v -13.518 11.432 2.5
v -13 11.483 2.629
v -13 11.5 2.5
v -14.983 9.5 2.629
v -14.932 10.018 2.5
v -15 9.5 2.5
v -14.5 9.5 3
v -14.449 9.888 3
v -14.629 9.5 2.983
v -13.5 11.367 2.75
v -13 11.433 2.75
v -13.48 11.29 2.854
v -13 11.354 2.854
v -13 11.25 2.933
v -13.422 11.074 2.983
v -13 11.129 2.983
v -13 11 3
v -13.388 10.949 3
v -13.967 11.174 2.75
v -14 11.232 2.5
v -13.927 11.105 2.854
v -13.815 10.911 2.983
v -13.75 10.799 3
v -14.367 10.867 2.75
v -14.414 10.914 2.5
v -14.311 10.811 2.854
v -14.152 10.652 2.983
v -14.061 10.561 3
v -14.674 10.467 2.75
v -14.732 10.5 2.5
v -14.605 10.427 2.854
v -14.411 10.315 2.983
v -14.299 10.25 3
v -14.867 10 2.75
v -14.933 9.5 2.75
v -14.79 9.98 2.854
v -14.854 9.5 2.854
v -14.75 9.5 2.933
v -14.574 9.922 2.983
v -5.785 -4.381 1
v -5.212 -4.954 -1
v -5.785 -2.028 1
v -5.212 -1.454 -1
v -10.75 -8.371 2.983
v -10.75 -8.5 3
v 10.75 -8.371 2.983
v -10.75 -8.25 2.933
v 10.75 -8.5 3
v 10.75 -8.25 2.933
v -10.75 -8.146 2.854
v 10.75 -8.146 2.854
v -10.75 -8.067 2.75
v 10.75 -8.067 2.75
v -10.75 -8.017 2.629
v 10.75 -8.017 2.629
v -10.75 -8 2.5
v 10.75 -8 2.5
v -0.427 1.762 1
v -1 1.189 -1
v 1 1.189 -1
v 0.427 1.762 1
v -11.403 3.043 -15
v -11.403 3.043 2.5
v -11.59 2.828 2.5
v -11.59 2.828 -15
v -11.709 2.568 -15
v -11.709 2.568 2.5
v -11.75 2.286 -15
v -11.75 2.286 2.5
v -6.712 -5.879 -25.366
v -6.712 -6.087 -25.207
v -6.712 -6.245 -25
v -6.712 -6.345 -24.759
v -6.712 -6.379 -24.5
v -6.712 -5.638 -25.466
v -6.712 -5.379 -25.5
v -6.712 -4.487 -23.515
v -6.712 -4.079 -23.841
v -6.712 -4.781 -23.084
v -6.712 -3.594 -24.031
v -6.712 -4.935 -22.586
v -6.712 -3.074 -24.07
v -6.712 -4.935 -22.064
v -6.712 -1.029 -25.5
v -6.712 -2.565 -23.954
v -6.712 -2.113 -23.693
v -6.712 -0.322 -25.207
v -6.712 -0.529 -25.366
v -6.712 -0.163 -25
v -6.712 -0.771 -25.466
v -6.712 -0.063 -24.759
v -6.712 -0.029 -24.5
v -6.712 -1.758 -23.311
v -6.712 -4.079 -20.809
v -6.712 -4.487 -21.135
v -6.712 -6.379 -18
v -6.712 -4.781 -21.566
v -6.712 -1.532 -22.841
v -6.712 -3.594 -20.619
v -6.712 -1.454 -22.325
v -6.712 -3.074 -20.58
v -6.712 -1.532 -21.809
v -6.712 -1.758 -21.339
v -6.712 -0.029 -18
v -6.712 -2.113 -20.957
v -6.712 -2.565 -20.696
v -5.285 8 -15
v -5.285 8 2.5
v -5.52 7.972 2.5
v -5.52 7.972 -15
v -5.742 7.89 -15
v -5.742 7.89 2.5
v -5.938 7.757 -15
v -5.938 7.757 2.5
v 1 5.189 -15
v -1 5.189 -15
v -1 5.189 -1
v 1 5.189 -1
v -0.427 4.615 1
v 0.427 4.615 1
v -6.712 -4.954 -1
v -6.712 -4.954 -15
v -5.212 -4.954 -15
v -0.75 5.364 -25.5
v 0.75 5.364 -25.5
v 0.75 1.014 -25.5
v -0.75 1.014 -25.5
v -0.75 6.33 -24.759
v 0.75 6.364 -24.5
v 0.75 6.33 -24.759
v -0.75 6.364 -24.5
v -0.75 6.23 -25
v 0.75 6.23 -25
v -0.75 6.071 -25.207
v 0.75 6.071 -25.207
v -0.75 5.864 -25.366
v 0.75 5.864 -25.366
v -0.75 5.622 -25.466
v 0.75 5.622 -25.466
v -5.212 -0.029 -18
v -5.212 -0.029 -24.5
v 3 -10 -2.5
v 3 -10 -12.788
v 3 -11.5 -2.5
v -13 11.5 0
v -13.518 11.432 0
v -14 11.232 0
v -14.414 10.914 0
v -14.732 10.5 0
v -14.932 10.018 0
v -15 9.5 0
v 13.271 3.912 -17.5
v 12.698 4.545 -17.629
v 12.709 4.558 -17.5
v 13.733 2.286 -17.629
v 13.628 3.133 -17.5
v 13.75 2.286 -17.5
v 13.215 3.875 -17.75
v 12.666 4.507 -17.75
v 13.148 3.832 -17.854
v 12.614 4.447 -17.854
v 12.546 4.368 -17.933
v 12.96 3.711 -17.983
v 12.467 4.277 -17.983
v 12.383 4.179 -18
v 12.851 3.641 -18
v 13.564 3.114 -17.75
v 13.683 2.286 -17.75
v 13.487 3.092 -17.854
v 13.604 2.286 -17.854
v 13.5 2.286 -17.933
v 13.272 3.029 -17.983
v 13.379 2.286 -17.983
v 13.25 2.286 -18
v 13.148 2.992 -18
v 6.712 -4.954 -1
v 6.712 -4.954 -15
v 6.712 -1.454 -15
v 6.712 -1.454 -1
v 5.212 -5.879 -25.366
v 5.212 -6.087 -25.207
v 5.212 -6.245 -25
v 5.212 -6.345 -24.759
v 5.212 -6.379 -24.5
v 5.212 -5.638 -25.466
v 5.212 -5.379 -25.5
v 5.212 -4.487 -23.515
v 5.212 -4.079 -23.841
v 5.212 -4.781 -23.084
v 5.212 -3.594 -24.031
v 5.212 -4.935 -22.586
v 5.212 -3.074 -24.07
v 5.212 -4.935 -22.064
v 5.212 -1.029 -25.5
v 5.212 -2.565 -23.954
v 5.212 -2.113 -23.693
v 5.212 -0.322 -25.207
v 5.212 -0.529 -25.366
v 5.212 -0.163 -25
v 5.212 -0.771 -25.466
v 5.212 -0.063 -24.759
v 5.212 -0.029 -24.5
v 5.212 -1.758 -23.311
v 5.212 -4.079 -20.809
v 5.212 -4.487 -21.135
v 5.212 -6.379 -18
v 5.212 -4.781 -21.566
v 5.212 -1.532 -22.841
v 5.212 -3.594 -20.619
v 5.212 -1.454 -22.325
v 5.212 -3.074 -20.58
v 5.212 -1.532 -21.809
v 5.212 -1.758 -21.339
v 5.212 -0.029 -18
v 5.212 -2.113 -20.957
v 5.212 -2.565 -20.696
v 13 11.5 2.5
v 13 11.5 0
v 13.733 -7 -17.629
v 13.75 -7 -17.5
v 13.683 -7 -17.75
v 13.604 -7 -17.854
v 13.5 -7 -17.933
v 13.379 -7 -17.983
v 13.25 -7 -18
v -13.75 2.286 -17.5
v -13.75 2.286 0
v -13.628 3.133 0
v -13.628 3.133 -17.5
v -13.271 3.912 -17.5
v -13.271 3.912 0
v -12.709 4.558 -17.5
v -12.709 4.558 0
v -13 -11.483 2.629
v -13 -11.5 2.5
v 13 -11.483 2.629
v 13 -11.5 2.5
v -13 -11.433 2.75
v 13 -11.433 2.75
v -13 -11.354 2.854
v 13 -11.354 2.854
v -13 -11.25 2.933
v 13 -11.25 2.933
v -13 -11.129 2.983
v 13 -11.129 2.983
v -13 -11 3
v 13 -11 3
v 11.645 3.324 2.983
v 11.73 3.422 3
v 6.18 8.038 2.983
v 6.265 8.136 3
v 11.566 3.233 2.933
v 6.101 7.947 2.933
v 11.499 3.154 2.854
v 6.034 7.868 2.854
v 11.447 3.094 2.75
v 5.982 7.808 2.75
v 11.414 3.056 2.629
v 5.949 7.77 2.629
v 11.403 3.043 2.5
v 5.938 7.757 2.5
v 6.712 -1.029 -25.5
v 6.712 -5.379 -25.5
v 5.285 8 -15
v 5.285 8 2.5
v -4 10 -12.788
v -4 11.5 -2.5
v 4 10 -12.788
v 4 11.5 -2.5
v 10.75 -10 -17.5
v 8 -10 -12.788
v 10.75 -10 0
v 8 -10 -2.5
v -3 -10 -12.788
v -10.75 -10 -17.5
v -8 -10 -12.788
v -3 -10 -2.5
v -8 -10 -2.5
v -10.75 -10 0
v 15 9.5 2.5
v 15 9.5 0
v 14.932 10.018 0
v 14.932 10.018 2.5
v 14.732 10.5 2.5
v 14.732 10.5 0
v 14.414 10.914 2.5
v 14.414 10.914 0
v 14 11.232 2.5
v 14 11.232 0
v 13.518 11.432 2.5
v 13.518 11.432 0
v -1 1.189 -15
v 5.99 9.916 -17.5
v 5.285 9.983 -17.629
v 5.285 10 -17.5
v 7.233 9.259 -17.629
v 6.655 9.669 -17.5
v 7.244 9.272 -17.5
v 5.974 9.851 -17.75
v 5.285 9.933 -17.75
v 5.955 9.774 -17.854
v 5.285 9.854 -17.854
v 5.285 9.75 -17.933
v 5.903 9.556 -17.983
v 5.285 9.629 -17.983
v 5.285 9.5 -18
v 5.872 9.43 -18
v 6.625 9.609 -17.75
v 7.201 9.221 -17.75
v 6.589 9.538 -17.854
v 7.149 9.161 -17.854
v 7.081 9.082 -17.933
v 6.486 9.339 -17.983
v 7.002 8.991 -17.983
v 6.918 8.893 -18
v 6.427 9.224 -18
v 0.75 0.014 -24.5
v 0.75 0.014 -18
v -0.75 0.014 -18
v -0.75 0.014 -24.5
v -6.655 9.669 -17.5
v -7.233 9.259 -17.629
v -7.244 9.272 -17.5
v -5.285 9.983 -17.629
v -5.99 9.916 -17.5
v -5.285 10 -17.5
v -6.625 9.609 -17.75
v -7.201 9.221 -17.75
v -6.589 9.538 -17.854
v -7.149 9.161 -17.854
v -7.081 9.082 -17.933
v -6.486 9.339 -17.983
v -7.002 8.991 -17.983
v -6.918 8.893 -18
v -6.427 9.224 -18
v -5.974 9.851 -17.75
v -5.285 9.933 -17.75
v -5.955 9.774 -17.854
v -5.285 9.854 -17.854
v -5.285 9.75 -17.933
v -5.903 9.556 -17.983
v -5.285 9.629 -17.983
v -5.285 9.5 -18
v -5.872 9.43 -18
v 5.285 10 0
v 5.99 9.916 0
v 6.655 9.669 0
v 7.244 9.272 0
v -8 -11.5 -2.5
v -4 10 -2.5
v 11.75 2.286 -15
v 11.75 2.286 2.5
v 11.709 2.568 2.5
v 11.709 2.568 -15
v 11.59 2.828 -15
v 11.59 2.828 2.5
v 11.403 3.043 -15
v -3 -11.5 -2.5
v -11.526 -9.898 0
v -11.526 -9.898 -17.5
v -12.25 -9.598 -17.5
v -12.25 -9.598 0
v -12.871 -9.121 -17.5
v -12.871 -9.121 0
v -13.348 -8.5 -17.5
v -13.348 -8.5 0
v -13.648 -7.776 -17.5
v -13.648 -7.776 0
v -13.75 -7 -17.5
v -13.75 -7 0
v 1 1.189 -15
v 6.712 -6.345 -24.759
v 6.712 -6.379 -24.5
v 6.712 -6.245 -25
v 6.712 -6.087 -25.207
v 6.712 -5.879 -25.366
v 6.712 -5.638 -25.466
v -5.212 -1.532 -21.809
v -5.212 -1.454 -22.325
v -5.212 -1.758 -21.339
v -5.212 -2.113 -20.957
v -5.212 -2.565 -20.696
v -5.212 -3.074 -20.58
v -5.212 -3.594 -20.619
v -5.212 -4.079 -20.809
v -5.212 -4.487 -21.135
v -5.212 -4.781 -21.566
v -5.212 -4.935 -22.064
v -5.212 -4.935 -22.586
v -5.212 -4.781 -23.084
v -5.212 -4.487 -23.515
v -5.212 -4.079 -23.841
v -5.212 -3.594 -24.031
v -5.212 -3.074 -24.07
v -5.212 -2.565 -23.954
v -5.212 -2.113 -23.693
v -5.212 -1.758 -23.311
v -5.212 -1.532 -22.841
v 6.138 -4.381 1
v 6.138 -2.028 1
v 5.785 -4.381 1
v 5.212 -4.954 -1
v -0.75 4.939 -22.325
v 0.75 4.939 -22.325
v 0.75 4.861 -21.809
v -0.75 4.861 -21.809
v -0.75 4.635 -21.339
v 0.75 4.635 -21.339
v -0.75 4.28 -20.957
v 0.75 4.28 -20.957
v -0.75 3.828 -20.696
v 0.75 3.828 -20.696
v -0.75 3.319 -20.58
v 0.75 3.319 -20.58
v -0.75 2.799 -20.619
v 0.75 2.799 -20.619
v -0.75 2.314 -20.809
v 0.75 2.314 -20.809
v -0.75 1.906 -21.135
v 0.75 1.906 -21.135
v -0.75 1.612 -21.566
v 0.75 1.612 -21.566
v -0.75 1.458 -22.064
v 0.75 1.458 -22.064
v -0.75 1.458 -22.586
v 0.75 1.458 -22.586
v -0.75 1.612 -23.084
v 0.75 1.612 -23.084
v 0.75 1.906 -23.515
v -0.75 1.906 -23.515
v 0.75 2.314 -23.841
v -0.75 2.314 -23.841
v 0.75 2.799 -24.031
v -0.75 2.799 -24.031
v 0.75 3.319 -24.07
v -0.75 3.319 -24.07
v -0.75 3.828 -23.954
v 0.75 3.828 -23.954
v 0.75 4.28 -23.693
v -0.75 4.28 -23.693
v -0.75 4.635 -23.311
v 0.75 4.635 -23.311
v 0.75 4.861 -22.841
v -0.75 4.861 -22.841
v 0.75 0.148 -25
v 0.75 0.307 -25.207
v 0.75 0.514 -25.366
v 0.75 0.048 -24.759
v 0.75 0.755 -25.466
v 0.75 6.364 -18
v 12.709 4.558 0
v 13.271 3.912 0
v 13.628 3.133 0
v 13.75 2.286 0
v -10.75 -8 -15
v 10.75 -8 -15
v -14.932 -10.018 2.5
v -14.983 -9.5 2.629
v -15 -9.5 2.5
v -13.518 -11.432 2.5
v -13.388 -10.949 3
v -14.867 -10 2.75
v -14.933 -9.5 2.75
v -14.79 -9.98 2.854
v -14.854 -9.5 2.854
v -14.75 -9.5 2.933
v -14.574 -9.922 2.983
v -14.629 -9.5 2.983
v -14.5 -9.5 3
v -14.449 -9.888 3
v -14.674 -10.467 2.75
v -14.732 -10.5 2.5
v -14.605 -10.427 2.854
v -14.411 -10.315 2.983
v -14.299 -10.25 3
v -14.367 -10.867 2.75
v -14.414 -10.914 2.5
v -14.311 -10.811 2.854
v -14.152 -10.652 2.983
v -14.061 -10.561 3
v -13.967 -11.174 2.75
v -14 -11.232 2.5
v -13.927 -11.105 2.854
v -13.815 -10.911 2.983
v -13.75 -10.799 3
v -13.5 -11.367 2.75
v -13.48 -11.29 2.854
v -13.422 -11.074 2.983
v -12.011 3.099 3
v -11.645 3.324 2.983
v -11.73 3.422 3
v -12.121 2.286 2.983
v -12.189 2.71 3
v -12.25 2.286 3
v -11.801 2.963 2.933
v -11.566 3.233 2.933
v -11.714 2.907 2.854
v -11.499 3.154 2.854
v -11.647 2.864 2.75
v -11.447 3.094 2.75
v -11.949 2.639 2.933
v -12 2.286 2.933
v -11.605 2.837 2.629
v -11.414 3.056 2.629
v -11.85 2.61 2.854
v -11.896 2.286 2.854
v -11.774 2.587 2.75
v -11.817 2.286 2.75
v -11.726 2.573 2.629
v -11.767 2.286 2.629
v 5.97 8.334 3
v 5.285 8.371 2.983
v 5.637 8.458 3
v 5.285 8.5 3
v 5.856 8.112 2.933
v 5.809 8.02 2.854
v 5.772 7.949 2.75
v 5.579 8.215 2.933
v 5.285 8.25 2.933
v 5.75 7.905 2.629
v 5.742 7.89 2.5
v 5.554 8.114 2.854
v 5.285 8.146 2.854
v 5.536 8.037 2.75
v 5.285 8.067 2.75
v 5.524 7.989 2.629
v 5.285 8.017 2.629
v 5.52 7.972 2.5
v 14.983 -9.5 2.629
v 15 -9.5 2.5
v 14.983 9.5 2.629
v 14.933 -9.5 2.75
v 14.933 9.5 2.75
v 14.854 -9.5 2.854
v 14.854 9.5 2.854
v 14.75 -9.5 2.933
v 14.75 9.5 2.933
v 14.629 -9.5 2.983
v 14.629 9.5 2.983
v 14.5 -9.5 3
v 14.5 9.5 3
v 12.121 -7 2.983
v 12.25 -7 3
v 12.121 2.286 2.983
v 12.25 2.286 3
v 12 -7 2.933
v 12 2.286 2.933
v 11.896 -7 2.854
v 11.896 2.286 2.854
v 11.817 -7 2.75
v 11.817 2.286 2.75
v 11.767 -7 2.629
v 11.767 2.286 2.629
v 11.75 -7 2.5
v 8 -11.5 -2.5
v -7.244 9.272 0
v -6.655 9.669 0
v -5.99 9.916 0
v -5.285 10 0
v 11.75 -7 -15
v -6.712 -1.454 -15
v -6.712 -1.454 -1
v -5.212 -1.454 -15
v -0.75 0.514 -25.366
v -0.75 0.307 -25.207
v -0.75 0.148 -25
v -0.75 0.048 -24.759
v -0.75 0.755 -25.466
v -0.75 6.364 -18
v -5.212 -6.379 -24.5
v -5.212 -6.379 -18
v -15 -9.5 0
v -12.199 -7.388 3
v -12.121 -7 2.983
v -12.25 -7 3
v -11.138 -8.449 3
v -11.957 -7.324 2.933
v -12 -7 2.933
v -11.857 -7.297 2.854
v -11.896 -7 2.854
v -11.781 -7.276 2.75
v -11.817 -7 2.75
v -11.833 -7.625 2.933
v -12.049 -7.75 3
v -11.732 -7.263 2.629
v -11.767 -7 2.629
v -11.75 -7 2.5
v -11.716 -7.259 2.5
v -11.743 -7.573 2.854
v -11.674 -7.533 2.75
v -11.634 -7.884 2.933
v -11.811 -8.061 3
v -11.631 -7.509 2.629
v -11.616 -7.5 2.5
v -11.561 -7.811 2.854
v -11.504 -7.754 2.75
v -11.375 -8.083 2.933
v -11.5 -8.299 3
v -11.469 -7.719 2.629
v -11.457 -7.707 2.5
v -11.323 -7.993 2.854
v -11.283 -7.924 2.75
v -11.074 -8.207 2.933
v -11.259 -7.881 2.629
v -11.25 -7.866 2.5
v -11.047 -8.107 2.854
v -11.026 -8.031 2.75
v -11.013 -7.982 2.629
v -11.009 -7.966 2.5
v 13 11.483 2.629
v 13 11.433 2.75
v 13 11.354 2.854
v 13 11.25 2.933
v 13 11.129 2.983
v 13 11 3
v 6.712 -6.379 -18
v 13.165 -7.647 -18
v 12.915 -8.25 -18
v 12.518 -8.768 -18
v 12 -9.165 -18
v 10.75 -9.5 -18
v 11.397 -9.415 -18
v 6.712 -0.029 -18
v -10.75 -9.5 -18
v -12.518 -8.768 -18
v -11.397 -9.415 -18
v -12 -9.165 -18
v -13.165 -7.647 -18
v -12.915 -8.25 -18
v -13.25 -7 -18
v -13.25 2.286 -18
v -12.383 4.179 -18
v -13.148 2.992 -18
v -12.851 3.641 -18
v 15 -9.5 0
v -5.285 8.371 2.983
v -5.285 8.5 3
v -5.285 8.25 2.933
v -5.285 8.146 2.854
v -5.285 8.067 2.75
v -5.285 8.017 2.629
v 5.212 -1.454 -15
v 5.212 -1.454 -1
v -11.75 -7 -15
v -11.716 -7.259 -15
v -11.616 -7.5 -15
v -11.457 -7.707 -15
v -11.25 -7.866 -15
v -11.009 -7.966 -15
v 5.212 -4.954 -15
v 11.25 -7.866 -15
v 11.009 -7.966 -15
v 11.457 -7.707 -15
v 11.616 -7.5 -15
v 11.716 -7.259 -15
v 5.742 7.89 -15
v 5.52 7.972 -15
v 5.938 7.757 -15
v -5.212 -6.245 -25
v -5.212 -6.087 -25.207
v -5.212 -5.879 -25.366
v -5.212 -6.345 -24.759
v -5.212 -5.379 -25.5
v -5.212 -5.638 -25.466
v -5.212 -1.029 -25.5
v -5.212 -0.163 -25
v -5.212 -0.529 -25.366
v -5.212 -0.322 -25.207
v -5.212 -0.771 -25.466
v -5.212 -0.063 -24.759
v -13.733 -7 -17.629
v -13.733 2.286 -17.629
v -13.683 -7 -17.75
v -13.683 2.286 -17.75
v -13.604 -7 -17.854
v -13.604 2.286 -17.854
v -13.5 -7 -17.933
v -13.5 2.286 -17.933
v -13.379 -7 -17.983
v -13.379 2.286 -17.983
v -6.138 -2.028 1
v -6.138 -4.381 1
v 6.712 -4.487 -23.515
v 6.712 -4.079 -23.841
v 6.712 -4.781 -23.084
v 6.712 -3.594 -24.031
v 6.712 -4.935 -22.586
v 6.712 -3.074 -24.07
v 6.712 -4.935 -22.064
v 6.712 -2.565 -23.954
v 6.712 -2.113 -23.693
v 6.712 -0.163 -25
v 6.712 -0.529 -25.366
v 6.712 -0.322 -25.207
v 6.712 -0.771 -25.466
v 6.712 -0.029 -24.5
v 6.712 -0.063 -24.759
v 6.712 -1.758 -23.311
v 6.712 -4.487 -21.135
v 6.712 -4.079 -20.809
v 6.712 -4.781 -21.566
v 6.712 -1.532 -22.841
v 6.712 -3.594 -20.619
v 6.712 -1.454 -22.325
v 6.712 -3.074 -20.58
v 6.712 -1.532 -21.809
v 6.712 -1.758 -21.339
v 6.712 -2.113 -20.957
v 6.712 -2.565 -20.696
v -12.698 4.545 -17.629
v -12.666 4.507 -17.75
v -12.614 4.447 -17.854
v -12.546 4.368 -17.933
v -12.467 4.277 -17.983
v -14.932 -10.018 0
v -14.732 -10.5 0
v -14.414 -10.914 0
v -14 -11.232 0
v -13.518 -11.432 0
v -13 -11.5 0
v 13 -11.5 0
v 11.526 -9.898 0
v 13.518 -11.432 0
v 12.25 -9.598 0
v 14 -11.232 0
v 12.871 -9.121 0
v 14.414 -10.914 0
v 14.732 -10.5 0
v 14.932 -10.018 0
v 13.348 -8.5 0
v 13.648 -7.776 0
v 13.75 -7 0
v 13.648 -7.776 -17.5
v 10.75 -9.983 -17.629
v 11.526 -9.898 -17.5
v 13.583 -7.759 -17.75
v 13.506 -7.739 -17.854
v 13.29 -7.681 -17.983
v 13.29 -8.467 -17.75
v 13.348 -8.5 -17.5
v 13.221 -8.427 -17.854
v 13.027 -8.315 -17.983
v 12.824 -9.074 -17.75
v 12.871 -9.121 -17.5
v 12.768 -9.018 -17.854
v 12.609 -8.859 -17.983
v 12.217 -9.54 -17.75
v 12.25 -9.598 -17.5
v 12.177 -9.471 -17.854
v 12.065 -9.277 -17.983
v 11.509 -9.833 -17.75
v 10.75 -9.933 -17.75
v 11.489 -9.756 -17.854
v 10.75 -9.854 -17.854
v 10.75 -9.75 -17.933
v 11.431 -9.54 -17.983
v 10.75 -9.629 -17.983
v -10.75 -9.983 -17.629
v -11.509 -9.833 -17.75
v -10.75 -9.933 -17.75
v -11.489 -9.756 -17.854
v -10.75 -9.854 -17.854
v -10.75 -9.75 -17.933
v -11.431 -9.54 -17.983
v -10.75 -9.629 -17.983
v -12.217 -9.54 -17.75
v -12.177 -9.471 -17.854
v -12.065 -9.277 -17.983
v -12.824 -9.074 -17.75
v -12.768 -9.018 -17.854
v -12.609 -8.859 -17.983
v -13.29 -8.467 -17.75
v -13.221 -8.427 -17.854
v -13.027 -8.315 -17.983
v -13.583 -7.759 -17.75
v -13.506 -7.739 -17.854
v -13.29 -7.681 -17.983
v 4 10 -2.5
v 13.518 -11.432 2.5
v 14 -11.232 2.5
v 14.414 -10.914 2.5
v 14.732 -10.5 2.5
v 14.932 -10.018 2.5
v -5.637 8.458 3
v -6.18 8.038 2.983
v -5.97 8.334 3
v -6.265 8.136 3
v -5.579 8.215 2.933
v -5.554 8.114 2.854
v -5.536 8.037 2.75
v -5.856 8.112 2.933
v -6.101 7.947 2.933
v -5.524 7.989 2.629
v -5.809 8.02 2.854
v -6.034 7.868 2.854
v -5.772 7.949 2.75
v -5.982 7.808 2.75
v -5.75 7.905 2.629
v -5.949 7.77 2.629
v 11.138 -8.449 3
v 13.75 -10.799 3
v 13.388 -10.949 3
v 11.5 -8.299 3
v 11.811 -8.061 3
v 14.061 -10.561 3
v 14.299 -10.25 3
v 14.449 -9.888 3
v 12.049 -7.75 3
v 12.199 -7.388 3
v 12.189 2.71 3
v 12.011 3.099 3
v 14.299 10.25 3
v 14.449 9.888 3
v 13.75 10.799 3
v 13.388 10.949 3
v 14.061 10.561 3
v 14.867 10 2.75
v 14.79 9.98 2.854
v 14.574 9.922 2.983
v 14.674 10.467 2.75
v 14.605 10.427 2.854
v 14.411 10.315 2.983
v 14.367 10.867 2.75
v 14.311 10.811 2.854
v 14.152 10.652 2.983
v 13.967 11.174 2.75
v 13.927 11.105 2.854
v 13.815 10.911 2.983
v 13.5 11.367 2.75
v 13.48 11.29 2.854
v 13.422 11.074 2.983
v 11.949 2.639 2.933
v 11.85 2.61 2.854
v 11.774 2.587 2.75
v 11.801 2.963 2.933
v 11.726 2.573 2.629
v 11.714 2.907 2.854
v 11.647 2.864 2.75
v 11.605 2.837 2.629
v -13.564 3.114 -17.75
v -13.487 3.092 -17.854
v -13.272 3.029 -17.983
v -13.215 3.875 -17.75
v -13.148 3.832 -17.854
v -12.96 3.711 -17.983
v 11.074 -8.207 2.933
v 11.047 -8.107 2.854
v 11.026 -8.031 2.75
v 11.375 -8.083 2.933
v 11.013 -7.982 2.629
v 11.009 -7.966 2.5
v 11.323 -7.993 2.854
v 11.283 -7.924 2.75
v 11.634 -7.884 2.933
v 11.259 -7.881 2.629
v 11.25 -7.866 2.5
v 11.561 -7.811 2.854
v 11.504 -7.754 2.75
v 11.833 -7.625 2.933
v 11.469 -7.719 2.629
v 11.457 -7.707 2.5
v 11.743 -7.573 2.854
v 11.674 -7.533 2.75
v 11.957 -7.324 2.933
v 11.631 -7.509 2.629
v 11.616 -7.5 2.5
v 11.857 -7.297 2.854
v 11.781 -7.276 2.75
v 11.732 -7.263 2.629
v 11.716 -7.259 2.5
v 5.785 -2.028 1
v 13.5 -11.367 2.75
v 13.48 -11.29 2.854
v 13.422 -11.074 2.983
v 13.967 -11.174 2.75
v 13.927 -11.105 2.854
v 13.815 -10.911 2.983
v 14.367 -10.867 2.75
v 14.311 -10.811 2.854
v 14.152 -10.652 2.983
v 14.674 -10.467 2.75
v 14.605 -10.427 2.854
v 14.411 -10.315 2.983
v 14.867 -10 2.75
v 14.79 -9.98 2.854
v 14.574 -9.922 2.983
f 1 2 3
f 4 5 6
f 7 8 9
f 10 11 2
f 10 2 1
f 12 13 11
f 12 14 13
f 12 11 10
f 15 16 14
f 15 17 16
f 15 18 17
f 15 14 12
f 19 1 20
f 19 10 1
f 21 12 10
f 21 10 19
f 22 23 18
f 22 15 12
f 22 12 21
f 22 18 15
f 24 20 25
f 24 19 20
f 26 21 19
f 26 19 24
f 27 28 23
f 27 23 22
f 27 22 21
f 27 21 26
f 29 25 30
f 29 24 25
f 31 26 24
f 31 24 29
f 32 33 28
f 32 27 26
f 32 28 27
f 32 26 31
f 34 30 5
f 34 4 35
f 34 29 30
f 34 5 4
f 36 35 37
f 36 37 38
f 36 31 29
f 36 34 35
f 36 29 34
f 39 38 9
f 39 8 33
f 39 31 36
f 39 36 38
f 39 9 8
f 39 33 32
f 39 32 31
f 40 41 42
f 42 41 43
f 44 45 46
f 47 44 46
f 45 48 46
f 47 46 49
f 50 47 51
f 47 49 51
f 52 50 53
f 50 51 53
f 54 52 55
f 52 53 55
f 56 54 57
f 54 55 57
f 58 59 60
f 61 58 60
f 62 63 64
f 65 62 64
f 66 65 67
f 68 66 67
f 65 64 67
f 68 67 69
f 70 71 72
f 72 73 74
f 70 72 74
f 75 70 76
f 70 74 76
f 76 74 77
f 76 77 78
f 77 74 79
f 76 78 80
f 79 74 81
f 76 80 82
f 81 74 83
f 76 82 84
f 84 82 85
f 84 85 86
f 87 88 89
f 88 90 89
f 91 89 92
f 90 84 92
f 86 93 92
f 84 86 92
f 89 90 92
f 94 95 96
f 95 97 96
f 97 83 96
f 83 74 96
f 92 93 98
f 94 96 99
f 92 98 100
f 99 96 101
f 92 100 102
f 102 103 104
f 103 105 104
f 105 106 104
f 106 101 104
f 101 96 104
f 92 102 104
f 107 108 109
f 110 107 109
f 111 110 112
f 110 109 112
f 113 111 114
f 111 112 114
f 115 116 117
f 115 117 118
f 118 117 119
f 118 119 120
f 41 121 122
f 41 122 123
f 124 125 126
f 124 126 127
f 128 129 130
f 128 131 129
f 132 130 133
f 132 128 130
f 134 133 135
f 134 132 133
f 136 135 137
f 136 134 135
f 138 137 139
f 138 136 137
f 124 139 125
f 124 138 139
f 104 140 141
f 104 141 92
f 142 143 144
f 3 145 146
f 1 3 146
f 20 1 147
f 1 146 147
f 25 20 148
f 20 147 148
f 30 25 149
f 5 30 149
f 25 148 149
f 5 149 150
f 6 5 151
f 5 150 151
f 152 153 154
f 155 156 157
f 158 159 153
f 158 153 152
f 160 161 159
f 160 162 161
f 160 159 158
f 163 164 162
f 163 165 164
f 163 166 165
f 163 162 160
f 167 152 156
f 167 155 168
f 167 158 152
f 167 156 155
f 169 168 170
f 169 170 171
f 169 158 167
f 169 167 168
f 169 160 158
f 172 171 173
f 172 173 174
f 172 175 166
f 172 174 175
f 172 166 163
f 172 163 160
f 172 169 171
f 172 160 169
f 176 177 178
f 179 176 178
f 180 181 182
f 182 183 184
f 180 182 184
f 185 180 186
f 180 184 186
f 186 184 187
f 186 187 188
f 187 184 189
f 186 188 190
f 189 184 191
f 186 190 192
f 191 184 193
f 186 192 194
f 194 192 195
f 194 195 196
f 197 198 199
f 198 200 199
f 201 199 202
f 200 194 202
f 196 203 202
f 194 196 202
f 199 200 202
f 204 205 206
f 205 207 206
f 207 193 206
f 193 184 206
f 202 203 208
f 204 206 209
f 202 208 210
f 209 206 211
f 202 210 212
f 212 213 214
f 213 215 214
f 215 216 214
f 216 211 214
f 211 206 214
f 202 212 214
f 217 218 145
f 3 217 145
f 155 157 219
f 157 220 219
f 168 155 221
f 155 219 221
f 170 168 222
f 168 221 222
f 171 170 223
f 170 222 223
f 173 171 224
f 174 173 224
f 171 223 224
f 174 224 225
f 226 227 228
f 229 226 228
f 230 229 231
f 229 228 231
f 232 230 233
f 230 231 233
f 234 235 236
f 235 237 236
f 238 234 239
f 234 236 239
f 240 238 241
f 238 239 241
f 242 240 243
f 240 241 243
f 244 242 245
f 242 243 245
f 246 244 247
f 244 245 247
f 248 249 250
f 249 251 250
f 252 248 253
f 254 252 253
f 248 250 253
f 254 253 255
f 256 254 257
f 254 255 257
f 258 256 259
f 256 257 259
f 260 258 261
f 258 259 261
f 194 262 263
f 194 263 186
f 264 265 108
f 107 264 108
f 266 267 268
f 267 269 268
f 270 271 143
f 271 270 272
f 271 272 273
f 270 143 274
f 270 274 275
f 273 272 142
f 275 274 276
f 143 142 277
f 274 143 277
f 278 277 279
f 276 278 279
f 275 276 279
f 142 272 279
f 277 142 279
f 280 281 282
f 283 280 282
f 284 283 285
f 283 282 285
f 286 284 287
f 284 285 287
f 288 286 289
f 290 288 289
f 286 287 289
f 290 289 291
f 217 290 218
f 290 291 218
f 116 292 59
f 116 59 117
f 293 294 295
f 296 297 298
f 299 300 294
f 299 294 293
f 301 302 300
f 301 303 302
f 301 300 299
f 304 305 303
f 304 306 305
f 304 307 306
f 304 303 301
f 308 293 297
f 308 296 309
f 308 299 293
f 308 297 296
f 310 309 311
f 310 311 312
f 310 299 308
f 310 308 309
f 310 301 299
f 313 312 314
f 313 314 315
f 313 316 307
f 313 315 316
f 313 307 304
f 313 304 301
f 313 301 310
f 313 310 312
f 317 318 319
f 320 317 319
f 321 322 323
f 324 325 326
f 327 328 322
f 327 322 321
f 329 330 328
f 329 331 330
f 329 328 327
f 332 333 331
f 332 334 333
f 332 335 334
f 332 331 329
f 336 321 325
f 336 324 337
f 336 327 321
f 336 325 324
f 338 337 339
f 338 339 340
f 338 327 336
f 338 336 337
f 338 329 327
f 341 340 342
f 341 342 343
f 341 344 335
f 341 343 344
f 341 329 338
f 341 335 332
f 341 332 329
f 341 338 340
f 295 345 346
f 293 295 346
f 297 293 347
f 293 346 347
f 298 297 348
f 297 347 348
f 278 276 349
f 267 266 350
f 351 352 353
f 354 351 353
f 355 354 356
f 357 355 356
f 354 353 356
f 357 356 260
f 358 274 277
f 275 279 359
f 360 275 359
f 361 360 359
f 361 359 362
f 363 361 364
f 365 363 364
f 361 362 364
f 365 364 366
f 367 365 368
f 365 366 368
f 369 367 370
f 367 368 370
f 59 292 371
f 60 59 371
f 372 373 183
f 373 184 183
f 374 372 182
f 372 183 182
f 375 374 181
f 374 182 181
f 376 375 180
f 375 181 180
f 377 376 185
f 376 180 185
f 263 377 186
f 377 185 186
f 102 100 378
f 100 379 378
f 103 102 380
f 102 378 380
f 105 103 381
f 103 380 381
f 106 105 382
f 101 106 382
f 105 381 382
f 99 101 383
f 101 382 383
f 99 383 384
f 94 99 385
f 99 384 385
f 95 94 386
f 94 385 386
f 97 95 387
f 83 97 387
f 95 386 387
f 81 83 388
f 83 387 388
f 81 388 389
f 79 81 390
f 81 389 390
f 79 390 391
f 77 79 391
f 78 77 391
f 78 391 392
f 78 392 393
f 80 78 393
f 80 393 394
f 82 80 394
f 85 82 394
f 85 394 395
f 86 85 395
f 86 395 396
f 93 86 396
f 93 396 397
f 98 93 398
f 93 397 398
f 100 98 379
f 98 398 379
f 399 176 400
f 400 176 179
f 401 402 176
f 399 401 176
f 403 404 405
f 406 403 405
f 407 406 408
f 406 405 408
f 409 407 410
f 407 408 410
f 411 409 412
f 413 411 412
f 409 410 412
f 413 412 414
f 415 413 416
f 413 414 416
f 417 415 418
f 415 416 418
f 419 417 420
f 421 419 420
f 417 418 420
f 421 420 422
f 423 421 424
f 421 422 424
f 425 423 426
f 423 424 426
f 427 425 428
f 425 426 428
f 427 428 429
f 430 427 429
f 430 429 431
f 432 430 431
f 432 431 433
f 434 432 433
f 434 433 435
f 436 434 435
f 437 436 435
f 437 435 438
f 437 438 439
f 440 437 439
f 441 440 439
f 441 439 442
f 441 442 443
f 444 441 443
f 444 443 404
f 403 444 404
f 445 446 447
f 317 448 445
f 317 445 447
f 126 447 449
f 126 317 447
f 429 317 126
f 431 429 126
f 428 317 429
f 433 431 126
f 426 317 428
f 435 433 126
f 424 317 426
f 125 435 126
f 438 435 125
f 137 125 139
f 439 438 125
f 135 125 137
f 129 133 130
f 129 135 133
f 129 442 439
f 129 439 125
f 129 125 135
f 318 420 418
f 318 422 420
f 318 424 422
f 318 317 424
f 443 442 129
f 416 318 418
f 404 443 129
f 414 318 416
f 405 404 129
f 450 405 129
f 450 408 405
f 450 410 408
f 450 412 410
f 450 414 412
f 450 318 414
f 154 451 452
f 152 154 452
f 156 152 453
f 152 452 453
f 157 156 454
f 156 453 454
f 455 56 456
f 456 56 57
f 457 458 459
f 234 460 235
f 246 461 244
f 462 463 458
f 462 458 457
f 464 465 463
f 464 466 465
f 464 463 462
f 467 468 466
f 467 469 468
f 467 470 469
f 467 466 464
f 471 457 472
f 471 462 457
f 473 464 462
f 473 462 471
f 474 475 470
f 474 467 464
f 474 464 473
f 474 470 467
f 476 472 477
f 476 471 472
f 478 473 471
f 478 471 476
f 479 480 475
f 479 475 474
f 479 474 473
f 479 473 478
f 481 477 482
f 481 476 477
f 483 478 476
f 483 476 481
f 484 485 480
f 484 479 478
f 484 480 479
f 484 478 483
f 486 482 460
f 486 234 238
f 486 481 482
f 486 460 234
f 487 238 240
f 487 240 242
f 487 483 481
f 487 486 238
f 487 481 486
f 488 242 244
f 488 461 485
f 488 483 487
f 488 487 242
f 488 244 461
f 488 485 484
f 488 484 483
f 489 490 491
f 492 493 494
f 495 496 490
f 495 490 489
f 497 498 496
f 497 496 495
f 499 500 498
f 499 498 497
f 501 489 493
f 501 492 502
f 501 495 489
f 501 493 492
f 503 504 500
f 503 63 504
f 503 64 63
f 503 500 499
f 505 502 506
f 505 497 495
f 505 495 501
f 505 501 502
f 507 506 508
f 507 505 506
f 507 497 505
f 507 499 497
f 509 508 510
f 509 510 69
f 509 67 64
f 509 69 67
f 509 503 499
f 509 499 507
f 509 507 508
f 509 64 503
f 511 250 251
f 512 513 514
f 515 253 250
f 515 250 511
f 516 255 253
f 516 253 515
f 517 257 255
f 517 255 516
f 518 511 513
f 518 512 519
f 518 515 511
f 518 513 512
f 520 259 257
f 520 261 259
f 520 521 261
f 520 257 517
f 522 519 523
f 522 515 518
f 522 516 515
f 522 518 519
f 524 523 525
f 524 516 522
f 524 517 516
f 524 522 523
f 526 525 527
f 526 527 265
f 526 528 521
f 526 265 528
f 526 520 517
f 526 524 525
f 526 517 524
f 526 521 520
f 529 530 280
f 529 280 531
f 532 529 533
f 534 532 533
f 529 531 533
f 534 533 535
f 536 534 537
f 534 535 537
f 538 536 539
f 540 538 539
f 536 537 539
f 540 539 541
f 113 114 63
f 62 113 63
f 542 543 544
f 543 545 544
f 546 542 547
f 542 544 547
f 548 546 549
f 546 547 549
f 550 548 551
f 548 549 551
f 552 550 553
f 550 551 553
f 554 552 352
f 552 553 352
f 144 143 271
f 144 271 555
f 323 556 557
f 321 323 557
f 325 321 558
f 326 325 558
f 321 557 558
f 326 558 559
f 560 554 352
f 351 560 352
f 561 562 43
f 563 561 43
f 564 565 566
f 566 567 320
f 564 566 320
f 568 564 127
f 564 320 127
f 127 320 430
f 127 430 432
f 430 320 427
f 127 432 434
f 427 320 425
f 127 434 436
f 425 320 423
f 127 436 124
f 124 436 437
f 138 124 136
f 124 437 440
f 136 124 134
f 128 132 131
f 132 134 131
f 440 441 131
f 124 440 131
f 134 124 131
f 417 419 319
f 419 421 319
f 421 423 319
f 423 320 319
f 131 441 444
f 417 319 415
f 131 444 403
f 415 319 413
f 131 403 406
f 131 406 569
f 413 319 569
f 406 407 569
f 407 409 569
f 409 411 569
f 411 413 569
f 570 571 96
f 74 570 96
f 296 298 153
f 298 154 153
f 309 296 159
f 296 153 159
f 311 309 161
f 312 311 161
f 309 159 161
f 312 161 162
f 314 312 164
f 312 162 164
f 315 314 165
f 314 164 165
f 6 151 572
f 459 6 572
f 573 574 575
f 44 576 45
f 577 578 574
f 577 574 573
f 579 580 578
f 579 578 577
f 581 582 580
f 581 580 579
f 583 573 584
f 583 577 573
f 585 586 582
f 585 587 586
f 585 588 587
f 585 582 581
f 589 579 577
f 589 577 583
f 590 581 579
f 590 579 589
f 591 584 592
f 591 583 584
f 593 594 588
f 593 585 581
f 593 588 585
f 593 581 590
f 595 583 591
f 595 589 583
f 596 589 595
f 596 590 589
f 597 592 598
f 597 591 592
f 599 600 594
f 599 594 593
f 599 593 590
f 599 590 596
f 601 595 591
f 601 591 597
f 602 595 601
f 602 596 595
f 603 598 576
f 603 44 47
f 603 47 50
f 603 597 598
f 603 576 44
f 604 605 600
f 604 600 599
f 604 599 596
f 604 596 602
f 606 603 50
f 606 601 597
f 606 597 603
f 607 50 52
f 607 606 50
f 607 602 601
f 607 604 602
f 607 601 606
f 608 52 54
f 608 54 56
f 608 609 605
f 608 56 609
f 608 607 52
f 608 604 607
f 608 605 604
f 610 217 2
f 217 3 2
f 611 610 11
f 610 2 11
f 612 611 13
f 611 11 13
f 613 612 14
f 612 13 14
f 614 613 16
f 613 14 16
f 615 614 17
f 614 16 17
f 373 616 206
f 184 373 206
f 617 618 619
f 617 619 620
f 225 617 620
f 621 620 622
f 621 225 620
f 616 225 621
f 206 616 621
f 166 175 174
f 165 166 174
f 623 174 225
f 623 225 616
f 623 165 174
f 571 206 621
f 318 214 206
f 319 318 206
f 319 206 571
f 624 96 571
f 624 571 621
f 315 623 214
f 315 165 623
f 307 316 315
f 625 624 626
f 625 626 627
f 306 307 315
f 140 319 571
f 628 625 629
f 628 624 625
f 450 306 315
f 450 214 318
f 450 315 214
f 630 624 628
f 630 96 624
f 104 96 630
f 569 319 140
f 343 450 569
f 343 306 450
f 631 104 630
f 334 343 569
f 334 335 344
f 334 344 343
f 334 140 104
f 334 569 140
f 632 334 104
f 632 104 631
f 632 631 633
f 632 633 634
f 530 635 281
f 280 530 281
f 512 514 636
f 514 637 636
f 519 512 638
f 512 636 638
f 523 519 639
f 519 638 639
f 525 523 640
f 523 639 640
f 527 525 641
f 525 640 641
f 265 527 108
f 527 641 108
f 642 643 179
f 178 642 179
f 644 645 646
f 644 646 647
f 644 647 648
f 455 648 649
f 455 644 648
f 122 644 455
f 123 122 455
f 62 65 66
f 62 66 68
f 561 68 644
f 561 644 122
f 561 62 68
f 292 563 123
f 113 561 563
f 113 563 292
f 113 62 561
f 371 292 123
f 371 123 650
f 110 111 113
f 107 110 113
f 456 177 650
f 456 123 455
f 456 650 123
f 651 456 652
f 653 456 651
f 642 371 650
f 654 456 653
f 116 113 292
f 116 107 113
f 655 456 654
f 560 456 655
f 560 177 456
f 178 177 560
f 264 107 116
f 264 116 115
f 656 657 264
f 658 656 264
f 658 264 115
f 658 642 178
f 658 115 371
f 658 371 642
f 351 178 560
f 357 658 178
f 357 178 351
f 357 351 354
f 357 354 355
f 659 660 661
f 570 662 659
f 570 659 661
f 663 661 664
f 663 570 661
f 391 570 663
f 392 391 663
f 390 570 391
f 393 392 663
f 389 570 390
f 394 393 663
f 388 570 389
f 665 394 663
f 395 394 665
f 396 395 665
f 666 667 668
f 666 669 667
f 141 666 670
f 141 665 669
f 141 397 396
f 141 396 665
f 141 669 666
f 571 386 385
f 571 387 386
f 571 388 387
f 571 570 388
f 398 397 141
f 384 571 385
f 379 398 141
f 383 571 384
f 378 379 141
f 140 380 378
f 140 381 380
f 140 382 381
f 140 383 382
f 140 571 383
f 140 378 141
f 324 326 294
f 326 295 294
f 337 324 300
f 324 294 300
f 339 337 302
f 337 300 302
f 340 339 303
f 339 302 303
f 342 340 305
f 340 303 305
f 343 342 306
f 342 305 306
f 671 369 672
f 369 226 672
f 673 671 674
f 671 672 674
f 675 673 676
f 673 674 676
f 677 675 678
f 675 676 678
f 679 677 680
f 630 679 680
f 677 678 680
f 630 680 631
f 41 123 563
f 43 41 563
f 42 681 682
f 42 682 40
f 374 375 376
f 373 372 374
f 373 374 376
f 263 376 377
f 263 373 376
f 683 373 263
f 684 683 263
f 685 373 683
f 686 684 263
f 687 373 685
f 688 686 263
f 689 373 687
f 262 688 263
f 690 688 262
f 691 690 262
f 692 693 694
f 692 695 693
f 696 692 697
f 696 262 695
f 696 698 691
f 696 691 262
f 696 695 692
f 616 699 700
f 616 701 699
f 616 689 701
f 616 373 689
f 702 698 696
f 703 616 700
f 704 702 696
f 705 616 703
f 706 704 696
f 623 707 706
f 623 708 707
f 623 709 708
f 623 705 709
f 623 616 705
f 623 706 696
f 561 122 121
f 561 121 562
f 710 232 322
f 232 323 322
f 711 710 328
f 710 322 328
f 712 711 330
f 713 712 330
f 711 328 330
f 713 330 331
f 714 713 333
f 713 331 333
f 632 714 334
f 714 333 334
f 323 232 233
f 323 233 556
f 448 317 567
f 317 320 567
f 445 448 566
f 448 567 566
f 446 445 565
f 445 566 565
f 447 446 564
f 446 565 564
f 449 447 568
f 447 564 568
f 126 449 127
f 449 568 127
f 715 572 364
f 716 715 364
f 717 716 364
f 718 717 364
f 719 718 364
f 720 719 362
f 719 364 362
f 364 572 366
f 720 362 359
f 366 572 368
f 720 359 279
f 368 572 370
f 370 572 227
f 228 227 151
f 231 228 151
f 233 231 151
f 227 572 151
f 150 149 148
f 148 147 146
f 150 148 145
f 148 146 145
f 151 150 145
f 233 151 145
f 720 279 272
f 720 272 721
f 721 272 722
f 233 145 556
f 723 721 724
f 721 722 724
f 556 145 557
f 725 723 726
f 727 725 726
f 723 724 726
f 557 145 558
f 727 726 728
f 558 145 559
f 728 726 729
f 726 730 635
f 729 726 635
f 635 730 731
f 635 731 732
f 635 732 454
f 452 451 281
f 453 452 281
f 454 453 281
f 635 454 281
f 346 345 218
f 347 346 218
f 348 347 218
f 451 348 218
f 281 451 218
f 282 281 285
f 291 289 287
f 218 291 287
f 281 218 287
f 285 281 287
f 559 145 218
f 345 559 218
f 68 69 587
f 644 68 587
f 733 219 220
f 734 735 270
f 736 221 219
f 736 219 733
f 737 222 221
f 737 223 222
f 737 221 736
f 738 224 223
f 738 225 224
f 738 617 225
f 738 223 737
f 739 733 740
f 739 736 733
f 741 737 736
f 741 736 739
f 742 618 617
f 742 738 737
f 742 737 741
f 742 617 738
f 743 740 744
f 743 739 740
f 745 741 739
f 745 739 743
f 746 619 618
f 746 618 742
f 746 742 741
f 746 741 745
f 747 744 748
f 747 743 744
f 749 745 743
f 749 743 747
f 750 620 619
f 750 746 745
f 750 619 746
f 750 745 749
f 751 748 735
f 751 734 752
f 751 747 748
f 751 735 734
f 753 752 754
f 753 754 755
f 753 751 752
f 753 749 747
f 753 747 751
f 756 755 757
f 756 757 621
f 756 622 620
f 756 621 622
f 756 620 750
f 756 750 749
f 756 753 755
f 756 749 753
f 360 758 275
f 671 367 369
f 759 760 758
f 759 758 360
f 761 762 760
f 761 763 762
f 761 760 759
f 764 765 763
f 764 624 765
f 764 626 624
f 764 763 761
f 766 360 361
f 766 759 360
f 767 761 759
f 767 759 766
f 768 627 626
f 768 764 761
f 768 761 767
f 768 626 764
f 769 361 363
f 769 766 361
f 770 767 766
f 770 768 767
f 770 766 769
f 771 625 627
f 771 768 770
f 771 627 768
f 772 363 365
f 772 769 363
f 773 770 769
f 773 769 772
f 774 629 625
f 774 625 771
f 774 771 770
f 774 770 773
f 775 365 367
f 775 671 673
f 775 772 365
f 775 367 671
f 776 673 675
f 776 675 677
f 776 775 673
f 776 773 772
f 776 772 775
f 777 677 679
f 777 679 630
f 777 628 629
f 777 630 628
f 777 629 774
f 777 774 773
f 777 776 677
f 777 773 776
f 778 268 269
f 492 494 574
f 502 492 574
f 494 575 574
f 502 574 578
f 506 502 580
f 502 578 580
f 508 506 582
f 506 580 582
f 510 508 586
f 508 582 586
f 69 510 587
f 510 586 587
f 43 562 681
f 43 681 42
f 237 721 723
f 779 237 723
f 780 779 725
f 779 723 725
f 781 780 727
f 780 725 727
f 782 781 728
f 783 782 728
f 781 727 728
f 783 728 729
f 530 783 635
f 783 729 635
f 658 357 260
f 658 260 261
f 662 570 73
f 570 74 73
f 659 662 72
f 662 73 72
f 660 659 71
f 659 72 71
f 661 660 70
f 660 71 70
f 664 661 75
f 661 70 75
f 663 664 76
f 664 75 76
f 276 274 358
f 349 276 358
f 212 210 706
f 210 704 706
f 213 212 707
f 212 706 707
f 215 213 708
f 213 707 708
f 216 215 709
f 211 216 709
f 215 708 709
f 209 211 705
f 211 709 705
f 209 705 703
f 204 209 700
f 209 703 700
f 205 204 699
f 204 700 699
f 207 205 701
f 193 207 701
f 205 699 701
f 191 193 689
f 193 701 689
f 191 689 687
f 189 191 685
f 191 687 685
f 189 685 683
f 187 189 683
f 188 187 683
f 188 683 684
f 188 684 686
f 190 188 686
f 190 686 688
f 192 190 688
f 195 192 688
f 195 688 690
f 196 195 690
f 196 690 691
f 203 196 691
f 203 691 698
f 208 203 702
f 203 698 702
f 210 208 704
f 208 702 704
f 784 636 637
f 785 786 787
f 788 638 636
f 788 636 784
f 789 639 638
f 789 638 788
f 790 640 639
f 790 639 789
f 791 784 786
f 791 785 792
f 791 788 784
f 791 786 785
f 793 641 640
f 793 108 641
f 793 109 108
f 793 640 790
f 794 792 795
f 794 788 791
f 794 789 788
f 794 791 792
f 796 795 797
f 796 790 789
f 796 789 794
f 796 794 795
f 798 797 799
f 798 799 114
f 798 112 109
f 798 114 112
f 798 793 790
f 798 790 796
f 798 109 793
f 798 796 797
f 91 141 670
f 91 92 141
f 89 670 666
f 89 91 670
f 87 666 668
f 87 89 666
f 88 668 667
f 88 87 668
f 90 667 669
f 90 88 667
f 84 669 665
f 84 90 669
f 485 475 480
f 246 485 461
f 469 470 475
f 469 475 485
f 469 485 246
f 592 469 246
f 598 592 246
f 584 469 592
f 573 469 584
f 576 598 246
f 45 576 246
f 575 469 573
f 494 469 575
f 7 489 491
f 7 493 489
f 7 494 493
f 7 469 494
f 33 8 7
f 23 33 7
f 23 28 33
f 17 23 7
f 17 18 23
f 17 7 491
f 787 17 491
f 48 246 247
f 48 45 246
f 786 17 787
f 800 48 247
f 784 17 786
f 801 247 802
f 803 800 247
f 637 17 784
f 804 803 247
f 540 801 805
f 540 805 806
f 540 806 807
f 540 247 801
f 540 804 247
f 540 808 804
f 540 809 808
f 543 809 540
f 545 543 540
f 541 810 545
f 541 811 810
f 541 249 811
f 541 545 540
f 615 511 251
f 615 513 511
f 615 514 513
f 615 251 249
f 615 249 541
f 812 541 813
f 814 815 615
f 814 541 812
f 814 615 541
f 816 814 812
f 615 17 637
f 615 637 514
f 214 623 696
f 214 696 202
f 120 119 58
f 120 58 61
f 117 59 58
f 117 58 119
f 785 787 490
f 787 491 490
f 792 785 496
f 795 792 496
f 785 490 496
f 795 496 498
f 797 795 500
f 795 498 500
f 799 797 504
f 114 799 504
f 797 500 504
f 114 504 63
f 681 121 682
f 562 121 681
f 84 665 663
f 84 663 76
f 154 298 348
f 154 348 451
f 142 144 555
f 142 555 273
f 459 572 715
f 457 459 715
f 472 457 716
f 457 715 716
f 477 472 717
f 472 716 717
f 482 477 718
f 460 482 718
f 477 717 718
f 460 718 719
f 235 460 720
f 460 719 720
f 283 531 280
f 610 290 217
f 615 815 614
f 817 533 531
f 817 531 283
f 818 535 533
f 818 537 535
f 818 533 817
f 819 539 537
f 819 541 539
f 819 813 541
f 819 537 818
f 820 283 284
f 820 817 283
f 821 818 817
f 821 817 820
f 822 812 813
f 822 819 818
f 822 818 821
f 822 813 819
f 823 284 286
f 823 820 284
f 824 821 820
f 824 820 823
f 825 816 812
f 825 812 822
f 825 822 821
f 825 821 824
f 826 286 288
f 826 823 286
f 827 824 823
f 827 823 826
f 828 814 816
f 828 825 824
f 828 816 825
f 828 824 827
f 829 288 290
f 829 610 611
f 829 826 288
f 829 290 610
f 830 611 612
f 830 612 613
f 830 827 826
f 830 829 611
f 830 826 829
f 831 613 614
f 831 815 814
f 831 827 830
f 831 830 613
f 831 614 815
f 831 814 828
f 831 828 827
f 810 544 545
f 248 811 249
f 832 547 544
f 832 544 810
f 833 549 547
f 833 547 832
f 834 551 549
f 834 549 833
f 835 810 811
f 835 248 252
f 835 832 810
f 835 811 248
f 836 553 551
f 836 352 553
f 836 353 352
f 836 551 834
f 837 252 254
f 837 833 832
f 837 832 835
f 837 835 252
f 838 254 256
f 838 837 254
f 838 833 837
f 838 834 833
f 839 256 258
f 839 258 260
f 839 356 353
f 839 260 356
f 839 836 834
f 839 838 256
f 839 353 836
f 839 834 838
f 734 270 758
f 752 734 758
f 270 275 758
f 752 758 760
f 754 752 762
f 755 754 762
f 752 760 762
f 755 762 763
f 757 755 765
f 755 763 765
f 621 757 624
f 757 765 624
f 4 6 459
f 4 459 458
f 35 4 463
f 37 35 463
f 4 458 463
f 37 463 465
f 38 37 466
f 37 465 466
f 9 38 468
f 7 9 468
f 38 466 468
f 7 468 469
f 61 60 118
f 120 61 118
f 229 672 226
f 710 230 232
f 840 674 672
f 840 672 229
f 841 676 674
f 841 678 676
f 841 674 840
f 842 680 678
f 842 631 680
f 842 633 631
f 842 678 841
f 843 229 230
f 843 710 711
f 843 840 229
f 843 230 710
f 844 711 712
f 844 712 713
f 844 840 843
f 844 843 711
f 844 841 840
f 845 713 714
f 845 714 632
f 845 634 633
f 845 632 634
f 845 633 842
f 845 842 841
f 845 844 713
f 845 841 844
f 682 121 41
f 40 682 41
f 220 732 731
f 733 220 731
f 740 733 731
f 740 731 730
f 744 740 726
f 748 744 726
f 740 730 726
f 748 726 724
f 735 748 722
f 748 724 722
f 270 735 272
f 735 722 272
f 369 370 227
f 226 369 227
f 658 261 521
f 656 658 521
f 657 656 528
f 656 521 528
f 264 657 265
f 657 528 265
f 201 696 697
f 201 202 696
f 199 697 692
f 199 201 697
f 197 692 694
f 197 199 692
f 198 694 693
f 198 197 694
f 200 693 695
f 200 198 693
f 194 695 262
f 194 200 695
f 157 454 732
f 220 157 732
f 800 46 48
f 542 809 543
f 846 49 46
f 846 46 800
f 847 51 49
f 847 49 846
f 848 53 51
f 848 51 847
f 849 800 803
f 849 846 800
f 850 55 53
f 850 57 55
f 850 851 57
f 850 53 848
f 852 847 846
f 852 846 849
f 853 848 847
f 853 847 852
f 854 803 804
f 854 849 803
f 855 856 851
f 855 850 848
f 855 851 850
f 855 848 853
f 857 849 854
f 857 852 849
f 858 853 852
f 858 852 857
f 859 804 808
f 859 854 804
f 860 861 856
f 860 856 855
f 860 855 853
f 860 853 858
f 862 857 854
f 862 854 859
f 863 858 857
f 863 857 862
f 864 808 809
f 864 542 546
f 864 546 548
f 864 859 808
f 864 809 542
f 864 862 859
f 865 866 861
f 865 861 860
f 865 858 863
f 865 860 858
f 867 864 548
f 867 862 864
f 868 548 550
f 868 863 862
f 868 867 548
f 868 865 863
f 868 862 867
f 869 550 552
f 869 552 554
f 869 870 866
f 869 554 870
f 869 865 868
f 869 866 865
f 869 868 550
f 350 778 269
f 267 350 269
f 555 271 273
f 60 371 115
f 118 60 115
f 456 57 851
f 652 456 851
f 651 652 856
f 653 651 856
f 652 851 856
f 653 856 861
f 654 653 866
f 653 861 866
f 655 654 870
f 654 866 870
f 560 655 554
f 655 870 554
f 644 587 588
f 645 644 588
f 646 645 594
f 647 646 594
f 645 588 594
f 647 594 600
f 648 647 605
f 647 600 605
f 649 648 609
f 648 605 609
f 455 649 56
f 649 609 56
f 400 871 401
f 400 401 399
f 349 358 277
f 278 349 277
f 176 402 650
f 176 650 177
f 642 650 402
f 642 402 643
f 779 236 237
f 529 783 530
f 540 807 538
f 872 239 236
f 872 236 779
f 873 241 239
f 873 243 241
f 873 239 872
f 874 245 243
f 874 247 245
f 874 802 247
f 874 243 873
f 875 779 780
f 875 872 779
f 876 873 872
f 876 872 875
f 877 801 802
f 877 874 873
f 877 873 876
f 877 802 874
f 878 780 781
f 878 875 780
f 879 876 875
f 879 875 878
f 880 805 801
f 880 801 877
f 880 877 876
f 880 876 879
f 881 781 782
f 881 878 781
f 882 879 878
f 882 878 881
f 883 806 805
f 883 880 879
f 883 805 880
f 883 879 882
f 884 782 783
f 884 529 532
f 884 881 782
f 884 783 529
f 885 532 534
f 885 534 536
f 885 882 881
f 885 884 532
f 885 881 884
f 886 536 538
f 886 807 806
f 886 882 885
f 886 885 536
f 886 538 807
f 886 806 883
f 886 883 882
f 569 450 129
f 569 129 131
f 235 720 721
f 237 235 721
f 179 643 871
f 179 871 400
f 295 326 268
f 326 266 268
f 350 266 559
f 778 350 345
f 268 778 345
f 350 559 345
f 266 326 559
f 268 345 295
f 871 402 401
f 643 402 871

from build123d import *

# Parameters (mm, degrees)
BOSS_EXTRUDE1_DEPTH           = 3
BOSS_EXTRUDE2_DEPTH           = 18
CUT_EXTRUDE1_DEPTH            = 18
FILLET2_R                     = 0.5
BOSS_EXTRUDE3_DEPTH           = 4
BOSS_EXTRUDE4_START           = 3
BOSS_EXTRUDE4_DEPTH           = 5
SKETCH6_W                     = 2
SKETCH6_H                     = 4
SKETCH6_W_2                   = 1.5
SKETCH6_H_2                   = 3.5
BOSS_EXTRUDE5_DEPTH           = 14
SKETCH7_W                     = 1.5
SKETCH7_H                     = 3.5
BOSS_EXTRUDE6_DEPTH           = 2
BOSS_EXTRUDE6_DRAFT           = 16
SKETCH7_W_2                   = 2
SKETCH7_H_2                   = 4
BOSS_EXTRUDE6_PROFILE_2_DEPTH = 2
BOSS_EXTRUDE6_PROFILE_2_DRAFT = 16
BOSS_EXTRUDE6_PROFILE_3_DEPTH = 2
BOSS_EXTRUDE6_PROFILE_3_DRAFT = 16
SKETCH8_W                     = 1.5
SKETCH8_H                     = 6.35
BOSS_EXTRUDE7_DEPTH           = 7.5
FILLET3_R                     = 1
SKETCH9_R                     = 1.75
CUT_EXTRUDE2_DEPTH            = 11


with BuildPart() as part:
    # Sketch1 → Boss-Extrude1 (new body)
    with BuildSketch(Plane.XY):
        with BuildLine():
            Line((-13, -11.5), (13, -11.5))
            ThreePointArc((13, -11.5), (14.414213562, -10.914213562), (15, -9.5))
            Line((15, -9.5), (15, 9.5))
            ThreePointArc((15, 9.5), (14.414213562, 10.914213562), (13, 11.5))
            Line((13, 11.5), (-13, 11.5))
            ThreePointArc((-13, 11.5), (-14.414213562, 10.914213562), (-15, 9.5))
            Line((-15, 9.5), (-15, -9.5))
            ThreePointArc((-15, -9.5), (-14.414213562, -10.914213562), (-13, -11.5))
        make_face()
    extrude(amount=BOSS_EXTRUDE1_DEPTH)

    # Sketch2 → Boss-Extrude2 (add)
    with BuildSketch(Plane(origin=(0, 0, 0), x_dir=(-1, 0, 0), z_dir=(0, 0, -1))):
        with BuildLine():
            Line((-7.244277484, 9.271690642), (-12.709444213, 4.557717215))
            ThreePointArc((-12.709444213, 4.557717215), (-13.477483514, 3.535359867), (-13.75, 2.286026573))
            Line((-13.75, 2.286026573), (-13.75, -7))
            ThreePointArc((-13.75, -7), (-12.871320344, -9.121320344), (-10.75, -10))
            Line((-10.75, -10), (10.75, -10))
            ThreePointArc((10.75, -10), (12.871320344, -9.121320344), (13.75, -7))
            Line((13.75, -7), (13.75, 2.286026573))
            ThreePointArc((13.75, 2.286026573), (13.477483514, 3.535359867), (12.709444213, 4.557717215))
            Line((12.709444213, 4.557717215), (7.244277484, 9.271690642))
            ThreePointArc((7.244277484, 9.271690642), (6.330043315, 9.812034133), (5.28483327, 10))
            Line((5.28483327, 10), (-5.28483327, 10))
            ThreePointArc((-5.28483327, 10), (-6.330043315, 9.812034133), (-7.244277484, 9.271690642))
        make_face()
    extrude(amount=BOSS_EXTRUDE2_DEPTH)

    # Sketch3 → Cut-Extrude1 (cut)
    with BuildSketch(Plane.XY.offset(3)):
        with BuildLine():
            Line((11.403148071, 3.043256787), (5.937981342, 7.757230214))
            ThreePointArc((5.937981342, 7.757230214), (5.633236618, 7.937344711), (5.28483327, 8))
            Line((5.28483327, 8), (-5.28483327, 8))
            ThreePointArc((-5.28483327, 8), (-5.633236618, 7.937344711), (-5.937981342, 7.757230214))
            Line((-5.937981342, 7.757230214), (-11.403148071, 3.043256787))
            ThreePointArc((-11.403148071, 3.043256787), (-11.659161171, 2.702471004), (-11.75, 2.286026573))
            Line((-11.75, 2.286026573), (-11.75, -7))
            ThreePointArc((-11.75, -7), (-11.457106781, -7.707106781), (-10.75, -8))
            Line((-10.75, -8), (10.75, -8))
            ThreePointArc((10.75, -8), (11.457106781, -7.707106781), (11.75, -7))
            Line((11.75, -7), (11.75, 2.286026573))
            ThreePointArc((11.75, 2.286026573), (11.659161171, 2.702471004), (11.403148071, 3.043256787))
        make_face()
    extrude(amount=-CUT_EXTRUDE1_DEPTH, mode=Mode.SUBTRACT)

    # Fillet2
    fillet2_edges = [part.edges().sort_by_distance(p)[0] for p in [
        (14.414213562, -10.914213562, 3),
        (15, 0, 3),
        (14.414213562, 10.914213562, 3),
        (0, 11.5, 3),
        (-14.414213562, 10.914213562, 3),
        (-15, 0, 3),
        (9.976860849, 6.914703929, -18),
        (13.75, -2.356986713, -18),
        (12.871320344, -9.121320344, -18),
        (-13.477483514, 3.535359867, -18),
        (-9.976860849, 6.914703929, -18),
        (-6.330043315, 9.812034133, -18),
        (0, 10, -18),
        (6.330043315, 9.812034133, -18),
        (13.477483514, 3.535359867, -18),
        (0, -10, -18),
        (-12.871320344, -9.121320344, -18),
        (-13.75, -2.356986713, -18),
        (-14.414213562, -10.914213562, 3),
        (11.659161171, 2.702471004, 3),
        (8.670564706, 5.400243501, 3),
        (5.633236618, 7.937344711, 3),
        (0, 8, 3),
        (-5.633236618, 7.937344711, 3),
        (-8.670564706, 5.400243501, 3),
        (-11.659161171, 2.702471004, 3),
        (-11.75, -2.356986713, 3),
        (-11.457106781, -7.707106781, 3),
        (0, -8, 3),
        (11.457106781, -7.707106781, 3),
        (11.75, -2.356986713, 3),
        (0, -11.5, 3),
    ]]
    fillet(fillet2_edges, radius=FILLET2_R)

    # Sketch4 → Boss-Extrude3 (add, symmetric)
    with BuildSketch(Plane(origin=(0, 0, 0), x_dir=(0, 0, -1), z_dir=(1, 0, 0))):
        Polygon((2.5, 10), (2.5, 11.5), (12.788235775, 10), align=None)
    extrude(amount=BOSS_EXTRUDE3_DEPTH, both=True)

    # Sketch5 → Boss-Extrude4 (add)
    with BuildSketch(Plane(origin=(0, 0, 0), x_dir=(0, 0, -1), z_dir=(1, 0, 0)).offset(BOSS_EXTRUDE4_START)):
        Polygon((2.5, -10), (12.788235775, -10), (2.5, -11.5), align=None)
    boss_extrude4 = extrude(amount=BOSS_EXTRUDE4_DEPTH)

    # Mirror1: Boss-Extrude4 across plane
    add(boss_extrude4.mirror(Plane(origin=(0, 0, 0), x_dir=(0, 0, 1), z_dir=(1, 0, 0))))

    # Sketch6 → Boss-Extrude5 (add)
    with BuildSketch(Plane.XY.offset(-15)):
        with Locations((0, 3.188606821)):
            Rectangle(SKETCH6_W, SKETCH6_H)
        with Locations((-5.961546064, -3.204394816)):
            Rectangle(SKETCH6_W_2, SKETCH6_H_2)
        with Locations((5.961546064, -3.204394816)):
            Rectangle(SKETCH6_W_2, SKETCH6_H_2)
    extrude(amount=BOSS_EXTRUDE5_DEPTH)


with BuildPart() as boss_extrude6_tool:
    # Sketch7 → Boss-Extrude6 (with draft: the straight prism first)
    with BuildSketch(Plane.XY.offset(-1)):
        with Locations((-5.961546064, -3.204394816)):
            Rectangle(SKETCH7_W, SKETCH7_H)
    extrude(amount=BOSS_EXTRUDE6_DEPTH)
    # Boss-Extrude6: the draft: its side faces are tilted about the plane it starts from
    boss_extrude6_sides = [boss_extrude6_tool.faces().sort_by_distance(p)[0] for p in [
        (-5.211546064, -3.204394816, 0),
        (-5.961546064, -1.454394816, 0),
        (-6.711546064, -3.204394816, 0),
        (-5.961546064, -4.954394816, 0),
    ]]
    draft(boss_extrude6_sides, Plane.XY.offset(-1), BOSS_EXTRUDE6_DRAFT)


with BuildPart() as part_1:
    add(part.part)

    # Boss-Extrude6: add boss_extrude6_tool
    add(boss_extrude6_tool.part)


with BuildPart() as boss_extrude6_profile_2_tool:
    # Sketch7 → Boss-Extrude6 profile 2 (with draft: the straight prism first)
    with BuildSketch(Plane.XY.offset(-1)):
        with Locations((0, 3.188606821)):
            Rectangle(SKETCH7_W_2, SKETCH7_H_2)
    extrude(amount=BOSS_EXTRUDE6_PROFILE_2_DEPTH)
    # Boss-Extrude6 profile 2: the draft: its side faces are tilted about the plane it starts from
    boss_extrude6_profile_2_sides = [boss_extrude6_profile_2_tool.faces().sort_by_distance(p)[0] for p in [
        (-1, 3.188606821, 0),
        (0, 1.188606821, 0),
        (1, 3.188606821, 0),
        (0, 5.188606821, 0),
    ]]
    draft(boss_extrude6_profile_2_sides, Plane.XY.offset(-1), BOSS_EXTRUDE6_PROFILE_2_DRAFT)


with BuildPart() as part_2:
    add(part_1.part)

    # Boss-Extrude6 profile 2: add boss_extrude6_profile_2_tool
    add(boss_extrude6_profile_2_tool.part)


with BuildPart() as boss_extrude6_profile_3_tool:
    # Sketch7 → Boss-Extrude6 profile 3 (with draft: the straight prism first)
    with BuildSketch(Plane.XY.offset(-1)):
        with Locations((5.961546064, -3.204394816)):
            Rectangle(SKETCH7_W, SKETCH7_H)
    extrude(amount=BOSS_EXTRUDE6_PROFILE_3_DEPTH)
    # Boss-Extrude6 profile 3: the draft: its side faces are tilted about the plane it starts from
    boss_extrude6_profile_3_sides = [boss_extrude6_profile_3_tool.faces().sort_by_distance(p)[0] for p in [
        (6.711546064, -3.204394816, 0),
        (5.961546064, -1.454394816, 0),
        (5.211546064, -3.204394816, 0),
        (5.961546064, -4.954394816, 0),
    ]]
    draft(boss_extrude6_profile_3_sides, Plane.XY.offset(-1), BOSS_EXTRUDE6_PROFILE_3_DRAFT)


with BuildPart() as part_3:
    add(part_2.part)

    # Boss-Extrude6 profile 3: add boss_extrude6_profile_3_tool
    add(boss_extrude6_profile_3_tool.part)

    # Sketch8 → Boss-Extrude7 (add)
    with BuildSketch(Plane(origin=(0, 0, -18), x_dir=(-1, 0, 0), z_dir=(0, 0, -1))):
        with Locations((0, 3.188606821)):
            Rectangle(SKETCH8_W, SKETCH8_H)
        with Locations((-5.961546064, -3.204394816)):
            Rectangle(SKETCH8_W, SKETCH8_H)
        with Locations((5.961546064, -3.204394816)):
            Rectangle(SKETCH8_W, SKETCH8_H)
    extrude(amount=BOSS_EXTRUDE7_DEPTH)

    # Fillet3
    fillet3_edges = [part_3.edges().sort_by_distance(p)[0] for p in [
        (0, 0.013606821, -25.5),
        (0, 6.363606821, -25.5),
        (5.961546064, -6.379394816, -25.5),
        (5.961546064, -0.029394816, -25.5),
        (-5.961546064, -6.379394816, -25.5),
        (-5.961546064, -0.029394816, -25.5),
    ]]
    fillet(fillet3_edges, radius=FILLET3_R)

    # Sketch9 → Cut-Extrude2 (cut, symmetric)
    with BuildSketch(Plane(origin=(0.75, 0, 0), x_dir=(0, 0, -1), z_dir=(1, 0, 0))):
        with Locations(Location((22.325, 3.188606821, 0), (0, 0, 90))):
            Circle(SKETCH9_R)
        with Locations(Location((22.325, -3.204394816, 0), (0, 0, 90))):
            Circle(SKETCH9_R)
    extrude(amount=CUT_EXTRUDE2_DEPTH, both=True, mode=Mode.SUBTRACT)


solid = part_3.part
